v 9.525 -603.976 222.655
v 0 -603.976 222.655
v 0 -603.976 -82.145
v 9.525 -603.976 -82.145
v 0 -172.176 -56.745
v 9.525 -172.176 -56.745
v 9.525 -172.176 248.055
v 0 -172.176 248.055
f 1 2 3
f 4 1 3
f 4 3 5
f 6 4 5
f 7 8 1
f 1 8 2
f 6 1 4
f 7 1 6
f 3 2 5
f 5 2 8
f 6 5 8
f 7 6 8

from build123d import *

# Parameters (mm, degrees)
F1_DEPTH = 9.525


with BuildPart() as f1:
    # F0 (on Right) → F1 (new body)
    with BuildSketch(Plane.YZ):
        Polygon((-603.97613, 222.654683), (-603.97613, -82.145317), (-172.17613, -56.745317), (-172.17613, 248.054683), align=None)
    extrude(amount=F1_DEPTH)


with BuildPart() as f2_1:
    # F2: copy of F1
    add(f1.part.moved(Location((482.6, 0, 0))))


solid = f1.part
